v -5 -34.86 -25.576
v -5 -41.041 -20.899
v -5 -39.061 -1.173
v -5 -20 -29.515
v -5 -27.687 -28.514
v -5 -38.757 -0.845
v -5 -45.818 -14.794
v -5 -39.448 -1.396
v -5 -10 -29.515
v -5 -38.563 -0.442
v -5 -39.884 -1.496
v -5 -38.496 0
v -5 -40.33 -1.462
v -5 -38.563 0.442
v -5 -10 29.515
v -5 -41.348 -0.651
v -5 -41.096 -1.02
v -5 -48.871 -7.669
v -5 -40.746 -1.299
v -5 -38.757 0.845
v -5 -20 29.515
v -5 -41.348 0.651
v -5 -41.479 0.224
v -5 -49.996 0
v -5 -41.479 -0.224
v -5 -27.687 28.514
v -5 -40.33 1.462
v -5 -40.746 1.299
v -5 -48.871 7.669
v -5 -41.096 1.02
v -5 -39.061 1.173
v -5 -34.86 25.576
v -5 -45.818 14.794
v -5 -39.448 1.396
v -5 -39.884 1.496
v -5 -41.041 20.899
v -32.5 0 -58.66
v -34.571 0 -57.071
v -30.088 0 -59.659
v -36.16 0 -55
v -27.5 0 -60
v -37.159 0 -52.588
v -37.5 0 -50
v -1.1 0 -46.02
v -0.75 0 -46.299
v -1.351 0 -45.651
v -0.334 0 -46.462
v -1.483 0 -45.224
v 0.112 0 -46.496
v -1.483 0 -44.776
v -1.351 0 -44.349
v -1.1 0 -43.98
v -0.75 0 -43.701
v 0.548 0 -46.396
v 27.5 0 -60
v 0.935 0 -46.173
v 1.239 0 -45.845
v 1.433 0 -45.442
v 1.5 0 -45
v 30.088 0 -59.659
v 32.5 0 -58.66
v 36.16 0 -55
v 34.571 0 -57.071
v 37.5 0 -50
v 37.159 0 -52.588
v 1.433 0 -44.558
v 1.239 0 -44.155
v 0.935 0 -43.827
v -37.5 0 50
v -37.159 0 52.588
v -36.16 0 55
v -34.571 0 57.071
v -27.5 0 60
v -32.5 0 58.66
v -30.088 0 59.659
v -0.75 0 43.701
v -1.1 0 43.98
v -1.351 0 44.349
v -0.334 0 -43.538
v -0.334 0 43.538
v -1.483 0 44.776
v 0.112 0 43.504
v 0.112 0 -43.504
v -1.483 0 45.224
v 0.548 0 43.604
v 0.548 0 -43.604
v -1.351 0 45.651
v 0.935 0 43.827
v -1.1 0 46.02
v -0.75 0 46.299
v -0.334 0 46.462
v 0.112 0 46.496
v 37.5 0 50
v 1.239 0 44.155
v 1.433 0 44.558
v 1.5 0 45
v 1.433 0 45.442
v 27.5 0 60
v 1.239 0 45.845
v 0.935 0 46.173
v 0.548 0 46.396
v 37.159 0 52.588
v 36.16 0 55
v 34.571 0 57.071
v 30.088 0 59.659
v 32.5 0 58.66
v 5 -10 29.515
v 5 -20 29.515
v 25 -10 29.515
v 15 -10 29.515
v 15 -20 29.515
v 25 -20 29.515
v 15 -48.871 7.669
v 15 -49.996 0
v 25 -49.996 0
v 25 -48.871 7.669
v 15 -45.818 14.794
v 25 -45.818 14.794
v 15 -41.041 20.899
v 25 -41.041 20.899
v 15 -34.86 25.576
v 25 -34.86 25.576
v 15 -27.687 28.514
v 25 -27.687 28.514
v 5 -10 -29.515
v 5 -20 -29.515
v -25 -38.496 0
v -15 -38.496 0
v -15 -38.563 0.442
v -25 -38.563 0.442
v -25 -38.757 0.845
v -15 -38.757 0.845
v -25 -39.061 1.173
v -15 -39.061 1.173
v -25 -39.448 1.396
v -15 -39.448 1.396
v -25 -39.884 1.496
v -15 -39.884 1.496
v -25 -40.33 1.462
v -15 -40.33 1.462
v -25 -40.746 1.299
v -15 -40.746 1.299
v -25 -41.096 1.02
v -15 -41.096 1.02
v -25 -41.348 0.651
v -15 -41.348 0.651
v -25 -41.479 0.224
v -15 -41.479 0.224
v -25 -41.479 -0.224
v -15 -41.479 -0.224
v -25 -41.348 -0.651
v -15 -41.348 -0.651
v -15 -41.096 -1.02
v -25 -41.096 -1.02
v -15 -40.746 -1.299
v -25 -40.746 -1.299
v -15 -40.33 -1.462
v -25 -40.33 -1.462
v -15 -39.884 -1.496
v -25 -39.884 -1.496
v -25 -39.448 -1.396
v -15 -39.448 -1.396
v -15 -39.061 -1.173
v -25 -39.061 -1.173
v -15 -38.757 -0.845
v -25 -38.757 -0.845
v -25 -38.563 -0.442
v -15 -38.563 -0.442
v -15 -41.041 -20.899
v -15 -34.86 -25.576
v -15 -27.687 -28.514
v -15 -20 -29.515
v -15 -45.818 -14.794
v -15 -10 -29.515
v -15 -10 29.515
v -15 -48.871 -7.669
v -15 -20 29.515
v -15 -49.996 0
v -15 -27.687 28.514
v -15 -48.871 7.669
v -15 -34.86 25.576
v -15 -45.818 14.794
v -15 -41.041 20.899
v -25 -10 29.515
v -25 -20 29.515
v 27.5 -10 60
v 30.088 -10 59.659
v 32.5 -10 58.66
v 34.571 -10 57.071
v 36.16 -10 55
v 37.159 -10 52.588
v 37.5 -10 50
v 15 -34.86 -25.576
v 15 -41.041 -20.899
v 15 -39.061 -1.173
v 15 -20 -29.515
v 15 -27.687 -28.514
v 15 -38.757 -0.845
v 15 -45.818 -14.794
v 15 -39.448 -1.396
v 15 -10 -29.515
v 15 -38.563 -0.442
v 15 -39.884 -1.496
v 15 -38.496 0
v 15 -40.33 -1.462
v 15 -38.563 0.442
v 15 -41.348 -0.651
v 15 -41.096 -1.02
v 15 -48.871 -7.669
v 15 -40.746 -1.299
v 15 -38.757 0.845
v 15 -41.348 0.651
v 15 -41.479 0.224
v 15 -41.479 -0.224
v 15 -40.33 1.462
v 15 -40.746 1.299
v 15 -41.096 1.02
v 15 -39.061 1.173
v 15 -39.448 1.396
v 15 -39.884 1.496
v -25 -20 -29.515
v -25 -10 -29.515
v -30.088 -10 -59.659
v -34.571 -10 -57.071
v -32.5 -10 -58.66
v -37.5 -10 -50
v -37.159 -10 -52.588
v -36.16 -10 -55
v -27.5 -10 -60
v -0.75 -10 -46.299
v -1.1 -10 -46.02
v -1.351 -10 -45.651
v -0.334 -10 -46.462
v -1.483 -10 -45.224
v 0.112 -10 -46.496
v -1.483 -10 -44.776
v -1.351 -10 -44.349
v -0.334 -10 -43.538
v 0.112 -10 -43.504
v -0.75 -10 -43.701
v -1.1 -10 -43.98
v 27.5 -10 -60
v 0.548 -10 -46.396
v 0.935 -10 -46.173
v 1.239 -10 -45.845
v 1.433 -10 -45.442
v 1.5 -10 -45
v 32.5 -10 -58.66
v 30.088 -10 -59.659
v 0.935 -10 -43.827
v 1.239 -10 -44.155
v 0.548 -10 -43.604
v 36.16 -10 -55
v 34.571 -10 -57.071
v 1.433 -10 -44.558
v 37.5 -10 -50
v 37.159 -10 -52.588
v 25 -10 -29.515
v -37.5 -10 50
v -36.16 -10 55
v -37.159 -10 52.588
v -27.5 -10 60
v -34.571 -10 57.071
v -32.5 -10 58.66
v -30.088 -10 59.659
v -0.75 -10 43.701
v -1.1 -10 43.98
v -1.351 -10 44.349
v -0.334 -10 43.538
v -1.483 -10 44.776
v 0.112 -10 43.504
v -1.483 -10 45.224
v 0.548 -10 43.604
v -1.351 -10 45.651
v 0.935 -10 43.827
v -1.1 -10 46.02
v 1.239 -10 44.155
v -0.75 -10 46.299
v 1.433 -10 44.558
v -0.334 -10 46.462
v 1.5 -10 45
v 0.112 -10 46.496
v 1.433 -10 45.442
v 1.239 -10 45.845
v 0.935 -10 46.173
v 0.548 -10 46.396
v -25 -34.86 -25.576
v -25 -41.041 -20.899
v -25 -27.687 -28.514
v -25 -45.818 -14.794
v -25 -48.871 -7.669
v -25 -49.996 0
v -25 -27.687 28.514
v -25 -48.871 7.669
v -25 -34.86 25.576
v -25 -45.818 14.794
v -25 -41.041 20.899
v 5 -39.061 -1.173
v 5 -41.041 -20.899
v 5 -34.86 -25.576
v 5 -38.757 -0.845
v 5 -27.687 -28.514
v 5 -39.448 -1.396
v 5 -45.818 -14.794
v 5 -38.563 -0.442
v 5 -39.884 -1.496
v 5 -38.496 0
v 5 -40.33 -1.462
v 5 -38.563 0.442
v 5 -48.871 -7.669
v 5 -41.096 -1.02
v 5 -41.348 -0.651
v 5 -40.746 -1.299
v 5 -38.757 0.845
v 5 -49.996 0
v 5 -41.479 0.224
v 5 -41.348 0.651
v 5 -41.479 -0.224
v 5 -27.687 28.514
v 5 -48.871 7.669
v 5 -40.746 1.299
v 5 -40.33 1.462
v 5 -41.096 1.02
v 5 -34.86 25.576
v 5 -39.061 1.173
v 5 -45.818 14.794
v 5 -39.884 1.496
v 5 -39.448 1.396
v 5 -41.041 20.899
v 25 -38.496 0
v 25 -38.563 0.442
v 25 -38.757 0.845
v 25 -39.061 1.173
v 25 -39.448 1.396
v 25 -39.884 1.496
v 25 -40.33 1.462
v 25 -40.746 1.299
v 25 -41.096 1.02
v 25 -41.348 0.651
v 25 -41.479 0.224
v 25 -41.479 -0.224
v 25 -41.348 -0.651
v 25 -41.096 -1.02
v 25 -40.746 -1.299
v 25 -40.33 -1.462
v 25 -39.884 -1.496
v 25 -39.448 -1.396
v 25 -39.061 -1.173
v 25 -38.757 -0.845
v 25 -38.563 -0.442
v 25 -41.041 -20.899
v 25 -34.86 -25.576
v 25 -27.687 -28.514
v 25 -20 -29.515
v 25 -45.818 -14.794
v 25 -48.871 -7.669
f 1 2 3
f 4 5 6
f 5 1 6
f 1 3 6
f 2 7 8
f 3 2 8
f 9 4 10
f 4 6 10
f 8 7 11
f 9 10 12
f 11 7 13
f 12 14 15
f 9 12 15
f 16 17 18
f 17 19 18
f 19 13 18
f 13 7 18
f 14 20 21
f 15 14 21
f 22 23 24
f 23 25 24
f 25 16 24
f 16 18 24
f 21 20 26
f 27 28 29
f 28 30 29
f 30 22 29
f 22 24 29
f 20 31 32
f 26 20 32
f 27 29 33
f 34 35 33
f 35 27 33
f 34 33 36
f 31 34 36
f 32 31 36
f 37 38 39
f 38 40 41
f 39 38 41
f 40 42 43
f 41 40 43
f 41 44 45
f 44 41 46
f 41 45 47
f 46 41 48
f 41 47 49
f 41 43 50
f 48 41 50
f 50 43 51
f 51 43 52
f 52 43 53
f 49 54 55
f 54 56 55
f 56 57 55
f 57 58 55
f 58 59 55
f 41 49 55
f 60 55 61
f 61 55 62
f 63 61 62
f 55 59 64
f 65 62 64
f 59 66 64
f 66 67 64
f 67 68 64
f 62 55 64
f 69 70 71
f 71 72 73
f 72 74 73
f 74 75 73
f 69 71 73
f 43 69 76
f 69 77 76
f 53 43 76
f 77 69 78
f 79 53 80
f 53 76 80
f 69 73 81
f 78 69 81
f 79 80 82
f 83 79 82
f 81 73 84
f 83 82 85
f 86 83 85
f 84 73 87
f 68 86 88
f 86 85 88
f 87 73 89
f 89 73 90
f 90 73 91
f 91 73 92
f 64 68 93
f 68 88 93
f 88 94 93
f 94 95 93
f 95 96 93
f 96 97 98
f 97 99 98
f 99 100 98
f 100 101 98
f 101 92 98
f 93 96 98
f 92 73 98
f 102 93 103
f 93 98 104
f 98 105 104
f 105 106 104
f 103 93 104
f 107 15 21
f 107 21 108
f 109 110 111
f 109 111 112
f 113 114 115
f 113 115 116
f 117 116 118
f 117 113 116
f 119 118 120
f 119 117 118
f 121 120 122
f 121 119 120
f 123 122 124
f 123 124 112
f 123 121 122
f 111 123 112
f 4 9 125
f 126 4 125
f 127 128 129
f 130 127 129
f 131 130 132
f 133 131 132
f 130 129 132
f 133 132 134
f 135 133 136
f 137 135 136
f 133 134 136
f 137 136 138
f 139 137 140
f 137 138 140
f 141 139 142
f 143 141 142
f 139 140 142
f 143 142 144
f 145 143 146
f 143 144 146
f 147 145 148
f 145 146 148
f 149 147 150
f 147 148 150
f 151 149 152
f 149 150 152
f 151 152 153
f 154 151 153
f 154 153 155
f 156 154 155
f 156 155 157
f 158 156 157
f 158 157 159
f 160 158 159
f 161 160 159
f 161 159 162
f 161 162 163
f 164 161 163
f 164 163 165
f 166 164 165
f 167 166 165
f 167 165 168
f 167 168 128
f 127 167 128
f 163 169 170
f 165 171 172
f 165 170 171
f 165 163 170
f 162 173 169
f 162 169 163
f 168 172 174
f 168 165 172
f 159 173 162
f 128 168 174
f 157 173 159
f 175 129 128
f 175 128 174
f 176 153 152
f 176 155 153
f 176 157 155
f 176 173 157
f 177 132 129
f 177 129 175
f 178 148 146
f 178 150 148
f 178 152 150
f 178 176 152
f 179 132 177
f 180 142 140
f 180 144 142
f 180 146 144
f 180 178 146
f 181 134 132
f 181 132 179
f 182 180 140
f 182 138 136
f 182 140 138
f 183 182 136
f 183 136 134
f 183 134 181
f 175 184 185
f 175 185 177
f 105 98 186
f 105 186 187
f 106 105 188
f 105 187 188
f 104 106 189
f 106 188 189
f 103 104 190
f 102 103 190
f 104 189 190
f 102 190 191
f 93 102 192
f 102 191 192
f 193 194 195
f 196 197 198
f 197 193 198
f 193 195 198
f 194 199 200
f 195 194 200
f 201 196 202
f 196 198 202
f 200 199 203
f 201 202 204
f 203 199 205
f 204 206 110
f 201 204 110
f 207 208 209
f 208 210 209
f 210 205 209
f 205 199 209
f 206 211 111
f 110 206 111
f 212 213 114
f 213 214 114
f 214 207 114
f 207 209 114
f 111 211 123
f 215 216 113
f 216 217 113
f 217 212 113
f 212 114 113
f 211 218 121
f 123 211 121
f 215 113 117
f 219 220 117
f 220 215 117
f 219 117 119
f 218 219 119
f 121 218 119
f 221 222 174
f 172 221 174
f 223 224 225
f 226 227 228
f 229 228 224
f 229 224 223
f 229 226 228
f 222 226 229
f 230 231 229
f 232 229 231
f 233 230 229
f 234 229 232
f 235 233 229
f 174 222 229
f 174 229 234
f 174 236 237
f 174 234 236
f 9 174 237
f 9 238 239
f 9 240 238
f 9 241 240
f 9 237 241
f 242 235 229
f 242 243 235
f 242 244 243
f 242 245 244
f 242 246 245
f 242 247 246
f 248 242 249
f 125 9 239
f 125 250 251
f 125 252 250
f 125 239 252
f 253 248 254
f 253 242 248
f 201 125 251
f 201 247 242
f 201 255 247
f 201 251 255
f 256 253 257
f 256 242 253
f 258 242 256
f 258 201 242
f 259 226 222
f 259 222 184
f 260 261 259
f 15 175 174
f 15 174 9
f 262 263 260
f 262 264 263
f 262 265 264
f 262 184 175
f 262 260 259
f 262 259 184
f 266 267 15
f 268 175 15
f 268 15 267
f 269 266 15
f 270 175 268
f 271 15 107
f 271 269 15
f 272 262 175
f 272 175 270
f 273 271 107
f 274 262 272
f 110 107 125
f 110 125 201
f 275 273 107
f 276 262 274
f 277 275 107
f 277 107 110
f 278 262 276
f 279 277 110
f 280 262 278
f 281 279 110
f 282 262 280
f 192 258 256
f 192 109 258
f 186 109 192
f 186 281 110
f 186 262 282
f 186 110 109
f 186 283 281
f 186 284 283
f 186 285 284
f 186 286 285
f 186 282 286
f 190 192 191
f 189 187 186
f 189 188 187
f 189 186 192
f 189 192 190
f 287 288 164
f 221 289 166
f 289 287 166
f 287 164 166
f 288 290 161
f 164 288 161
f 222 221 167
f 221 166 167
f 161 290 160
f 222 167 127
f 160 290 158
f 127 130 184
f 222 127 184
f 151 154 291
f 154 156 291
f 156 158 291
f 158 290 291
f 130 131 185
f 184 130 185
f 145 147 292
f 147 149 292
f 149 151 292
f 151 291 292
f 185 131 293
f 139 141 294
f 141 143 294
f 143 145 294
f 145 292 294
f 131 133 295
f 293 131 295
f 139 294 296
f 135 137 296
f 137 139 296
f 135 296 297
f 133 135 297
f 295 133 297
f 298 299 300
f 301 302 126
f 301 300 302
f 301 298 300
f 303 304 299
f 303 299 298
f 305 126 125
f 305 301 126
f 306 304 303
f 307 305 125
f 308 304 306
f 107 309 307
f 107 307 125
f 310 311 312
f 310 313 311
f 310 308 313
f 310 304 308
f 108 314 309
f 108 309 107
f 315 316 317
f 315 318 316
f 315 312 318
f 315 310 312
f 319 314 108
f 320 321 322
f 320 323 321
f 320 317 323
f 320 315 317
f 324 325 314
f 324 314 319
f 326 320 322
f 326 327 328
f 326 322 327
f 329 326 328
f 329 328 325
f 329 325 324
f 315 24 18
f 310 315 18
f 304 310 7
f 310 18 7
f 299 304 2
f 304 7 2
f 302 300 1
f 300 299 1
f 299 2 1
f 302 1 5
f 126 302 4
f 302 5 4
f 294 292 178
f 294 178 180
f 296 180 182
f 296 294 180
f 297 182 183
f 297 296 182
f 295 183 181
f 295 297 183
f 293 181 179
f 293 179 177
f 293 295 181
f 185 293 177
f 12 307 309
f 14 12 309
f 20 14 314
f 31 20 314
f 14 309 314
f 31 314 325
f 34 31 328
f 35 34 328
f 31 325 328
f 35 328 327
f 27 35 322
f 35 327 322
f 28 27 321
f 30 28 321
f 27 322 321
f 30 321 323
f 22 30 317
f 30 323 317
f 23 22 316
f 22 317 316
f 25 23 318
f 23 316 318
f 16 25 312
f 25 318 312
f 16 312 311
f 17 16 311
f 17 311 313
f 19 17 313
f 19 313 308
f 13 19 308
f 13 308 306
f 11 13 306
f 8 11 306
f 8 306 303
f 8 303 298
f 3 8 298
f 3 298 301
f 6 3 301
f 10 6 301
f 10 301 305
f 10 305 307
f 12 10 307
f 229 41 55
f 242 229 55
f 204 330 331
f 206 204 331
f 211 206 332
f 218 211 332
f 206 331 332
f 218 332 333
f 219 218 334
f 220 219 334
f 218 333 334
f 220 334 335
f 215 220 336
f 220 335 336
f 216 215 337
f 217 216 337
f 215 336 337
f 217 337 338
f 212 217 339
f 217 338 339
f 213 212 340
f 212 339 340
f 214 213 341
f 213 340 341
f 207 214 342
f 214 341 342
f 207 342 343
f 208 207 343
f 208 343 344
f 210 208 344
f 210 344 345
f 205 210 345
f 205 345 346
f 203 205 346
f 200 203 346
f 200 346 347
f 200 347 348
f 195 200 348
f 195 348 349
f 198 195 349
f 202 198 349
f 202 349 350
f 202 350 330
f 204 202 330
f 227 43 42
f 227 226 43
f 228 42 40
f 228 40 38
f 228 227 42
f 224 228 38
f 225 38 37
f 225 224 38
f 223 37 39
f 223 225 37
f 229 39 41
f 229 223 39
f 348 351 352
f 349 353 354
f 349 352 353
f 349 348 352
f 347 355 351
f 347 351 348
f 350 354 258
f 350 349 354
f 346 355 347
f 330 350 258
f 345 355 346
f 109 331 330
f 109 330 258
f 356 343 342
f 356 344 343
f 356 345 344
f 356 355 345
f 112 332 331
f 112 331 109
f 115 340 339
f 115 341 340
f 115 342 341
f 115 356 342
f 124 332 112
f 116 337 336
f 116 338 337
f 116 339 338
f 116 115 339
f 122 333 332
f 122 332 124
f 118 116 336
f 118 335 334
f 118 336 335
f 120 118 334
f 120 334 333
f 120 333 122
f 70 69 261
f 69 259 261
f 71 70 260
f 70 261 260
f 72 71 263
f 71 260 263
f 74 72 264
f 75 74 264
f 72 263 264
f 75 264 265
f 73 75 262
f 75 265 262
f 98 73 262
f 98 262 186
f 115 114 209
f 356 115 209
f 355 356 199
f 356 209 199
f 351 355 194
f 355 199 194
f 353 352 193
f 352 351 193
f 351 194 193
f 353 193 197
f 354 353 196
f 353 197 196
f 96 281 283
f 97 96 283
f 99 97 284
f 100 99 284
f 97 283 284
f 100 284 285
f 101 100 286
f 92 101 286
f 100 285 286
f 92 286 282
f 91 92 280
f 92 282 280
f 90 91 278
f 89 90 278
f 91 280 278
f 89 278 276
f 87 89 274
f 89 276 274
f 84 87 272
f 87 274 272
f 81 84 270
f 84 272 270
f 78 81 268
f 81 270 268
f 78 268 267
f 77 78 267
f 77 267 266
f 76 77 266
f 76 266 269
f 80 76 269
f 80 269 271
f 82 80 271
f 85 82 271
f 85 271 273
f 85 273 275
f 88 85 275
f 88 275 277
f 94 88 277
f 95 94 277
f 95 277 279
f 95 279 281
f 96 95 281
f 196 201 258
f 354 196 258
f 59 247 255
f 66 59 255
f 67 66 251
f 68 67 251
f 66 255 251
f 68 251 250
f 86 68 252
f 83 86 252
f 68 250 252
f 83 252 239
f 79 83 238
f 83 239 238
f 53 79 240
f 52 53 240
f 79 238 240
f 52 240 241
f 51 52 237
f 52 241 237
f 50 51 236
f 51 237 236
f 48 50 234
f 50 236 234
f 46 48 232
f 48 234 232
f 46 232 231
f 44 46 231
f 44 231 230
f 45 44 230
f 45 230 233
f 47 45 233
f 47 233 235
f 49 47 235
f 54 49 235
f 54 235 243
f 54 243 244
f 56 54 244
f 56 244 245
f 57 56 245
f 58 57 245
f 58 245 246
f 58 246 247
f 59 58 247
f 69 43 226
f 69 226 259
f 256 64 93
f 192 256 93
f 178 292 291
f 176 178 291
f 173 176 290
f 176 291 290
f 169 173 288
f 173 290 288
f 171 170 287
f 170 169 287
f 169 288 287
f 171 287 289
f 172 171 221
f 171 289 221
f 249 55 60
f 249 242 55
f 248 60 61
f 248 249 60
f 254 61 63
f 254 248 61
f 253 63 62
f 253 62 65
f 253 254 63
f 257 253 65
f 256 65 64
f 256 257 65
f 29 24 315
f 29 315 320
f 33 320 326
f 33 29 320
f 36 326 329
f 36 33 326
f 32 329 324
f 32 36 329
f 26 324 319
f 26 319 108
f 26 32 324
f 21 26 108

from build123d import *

# Parameters (mm, degrees)
F0_W        = 75
F0_H        = 120
F1_DEPTH    = 10
F2_R        = 1.5
F3_DEPTH    = 41.3
F4_W        = 75
F4_H        = 59.0305535599
F5_DEPTH    = 40
F7_R        = 10
F6_W        = 12.5
F6_H        = 59.0305535599
F6_W_2      = 10
F8_DEPTH    = 40
F9_T1_DEPTH = 160
F9_T3_DEPTH = 160
F9_T5_DEPTH = 160
F10_R       = 1.5
F11_DEPTH   = 57.1


# Not quite as in the source:
# - a fillet or chamfer that OpenCascade refuses, or shapes differently, is made with other operations: its cross-section is extruded or revolved along the edge and cut away or added


with BuildPart() as f1:
    # F0 (on Front) → F1 (new body)
    with BuildSketch(Plane.XZ):
        Rectangle(F0_W, F0_H)
    extrude(amount=F1_DEPTH)

    # F2 (on face) → F3 (cut)
    with BuildSketch(Plane.XZ.offset(10)):
        with Locations((0, -45)):
            Circle(F2_R)
        with Locations((0, 45)):
            Circle(F2_R)
    extrude(amount=-F3_DEPTH, mode=Mode.SUBTRACT)

    # F4 (on face) → F5 (join)
    with BuildSketch(Plane.XZ.offset(10)):
        Rectangle(F4_W, F4_H)
    extrude(amount=F5_DEPTH)

    # F7
    f7_edges = [f1.edges().sort_by_distance(p)[0] for p in [
        (37.5, -5, 60),
        (-37.5, -5, 60),
        (-37.5, -5, -60),
        (37.5, -5, -60),
    ]]
    fillet(f7_edges, radius=F7_R)

    # F6 (on face) → F8 (cut)
    with BuildSketch(Plane.XZ.offset(50)):
        with Locations((-31.25, 0)):
            Rectangle(F6_W, F6_H)
        with Locations((-10, 0)):
            Rectangle(F6_W_2, F6_H)
        with Locations((10, 0)):
            Rectangle(F6_W_2, F6_H)
        with Locations((31.25, 0)):
            Rectangle(F6_W, F6_H)
    extrude(amount=-F8_DEPTH, mode=Mode.SUBTRACT)

    # F9: fillet of radius 30 on 6 edges, made by hand

    # F9_s2 → F9_t1 (cut)
    with BuildSketch(Plane.YZ.offset(-60)):
        with BuildLine():
            ThreePointArc((-50, -0.4847232201), (-41.2132034356, 20.7284802155), (-20, 29.5152767799))
            Line((-20, 29.5152767799), (-50, 29.5152767799))
            Line((-50, 29.5152767799), (-50, -0.4847232201))
        make_face()
        with BuildLine():
            ThreePointArc((-50, 0.4847232201), (-41.2132034356, -20.7284802155), (-20, -29.5152767799))
            Line((-20, -29.5152767799), (-50, -29.5152767799))
            Line((-50, -29.5152767799), (-50, 0.4847232201))
        make_face()
    extrude(amount=F9_T1_DEPTH, mode=Mode.SUBTRACT)

    # F9_s4 → F9_t3 (cut)
    with BuildSketch(Plane.YZ.offset(-80)):
        with BuildLine():
            ThreePointArc((-50, -0.4847232201), (-41.2132034356, 20.7284802155), (-20, 29.5152767799))
            Line((-20, 29.5152767799), (-50, 29.5152767799))
            Line((-50, 29.5152767799), (-50, -0.4847232201))
        make_face()
        with BuildLine():
            ThreePointArc((-50, 0.4847232201), (-41.2132034356, -20.7284802155), (-20, -29.5152767799))
            Line((-20, -29.5152767799), (-50, -29.5152767799))
            Line((-50, -29.5152767799), (-50, 0.4847232201))
        make_face()
    extrude(amount=F9_T3_DEPTH, mode=Mode.SUBTRACT)

    # F9_s6 → F9_t5 (cut)
    with BuildSketch(Plane.YZ.offset(-100)):
        with BuildLine():
            ThreePointArc((-50, -0.4847232201), (-41.2132034356, 20.7284802155), (-20, 29.5152767799))
            Line((-20, 29.5152767799), (-50, 29.5152767799))
            Line((-50, 29.5152767799), (-50, -0.4847232201))
        make_face()
        with BuildLine():
            ThreePointArc((-50, 0.4847232201), (-41.2132034356, -20.7284802155), (-20, -29.5152767799))
            Line((-20, -29.5152767799), (-50, -29.5152767799))
            Line((-50, -29.5152767799), (-50, 0.4847232201))
        make_face()
    extrude(amount=F9_T5_DEPTH, mode=Mode.SUBTRACT)

    # F10 (on face) → F11 (cut)
    with BuildSketch(Plane.YZ.offset(25)):
        with Locations((-39.9960838011, 0)):
            Circle(F10_R)
    extrude(amount=-F11_DEPTH, mode=Mode.SUBTRACT)


solid = f1.part
